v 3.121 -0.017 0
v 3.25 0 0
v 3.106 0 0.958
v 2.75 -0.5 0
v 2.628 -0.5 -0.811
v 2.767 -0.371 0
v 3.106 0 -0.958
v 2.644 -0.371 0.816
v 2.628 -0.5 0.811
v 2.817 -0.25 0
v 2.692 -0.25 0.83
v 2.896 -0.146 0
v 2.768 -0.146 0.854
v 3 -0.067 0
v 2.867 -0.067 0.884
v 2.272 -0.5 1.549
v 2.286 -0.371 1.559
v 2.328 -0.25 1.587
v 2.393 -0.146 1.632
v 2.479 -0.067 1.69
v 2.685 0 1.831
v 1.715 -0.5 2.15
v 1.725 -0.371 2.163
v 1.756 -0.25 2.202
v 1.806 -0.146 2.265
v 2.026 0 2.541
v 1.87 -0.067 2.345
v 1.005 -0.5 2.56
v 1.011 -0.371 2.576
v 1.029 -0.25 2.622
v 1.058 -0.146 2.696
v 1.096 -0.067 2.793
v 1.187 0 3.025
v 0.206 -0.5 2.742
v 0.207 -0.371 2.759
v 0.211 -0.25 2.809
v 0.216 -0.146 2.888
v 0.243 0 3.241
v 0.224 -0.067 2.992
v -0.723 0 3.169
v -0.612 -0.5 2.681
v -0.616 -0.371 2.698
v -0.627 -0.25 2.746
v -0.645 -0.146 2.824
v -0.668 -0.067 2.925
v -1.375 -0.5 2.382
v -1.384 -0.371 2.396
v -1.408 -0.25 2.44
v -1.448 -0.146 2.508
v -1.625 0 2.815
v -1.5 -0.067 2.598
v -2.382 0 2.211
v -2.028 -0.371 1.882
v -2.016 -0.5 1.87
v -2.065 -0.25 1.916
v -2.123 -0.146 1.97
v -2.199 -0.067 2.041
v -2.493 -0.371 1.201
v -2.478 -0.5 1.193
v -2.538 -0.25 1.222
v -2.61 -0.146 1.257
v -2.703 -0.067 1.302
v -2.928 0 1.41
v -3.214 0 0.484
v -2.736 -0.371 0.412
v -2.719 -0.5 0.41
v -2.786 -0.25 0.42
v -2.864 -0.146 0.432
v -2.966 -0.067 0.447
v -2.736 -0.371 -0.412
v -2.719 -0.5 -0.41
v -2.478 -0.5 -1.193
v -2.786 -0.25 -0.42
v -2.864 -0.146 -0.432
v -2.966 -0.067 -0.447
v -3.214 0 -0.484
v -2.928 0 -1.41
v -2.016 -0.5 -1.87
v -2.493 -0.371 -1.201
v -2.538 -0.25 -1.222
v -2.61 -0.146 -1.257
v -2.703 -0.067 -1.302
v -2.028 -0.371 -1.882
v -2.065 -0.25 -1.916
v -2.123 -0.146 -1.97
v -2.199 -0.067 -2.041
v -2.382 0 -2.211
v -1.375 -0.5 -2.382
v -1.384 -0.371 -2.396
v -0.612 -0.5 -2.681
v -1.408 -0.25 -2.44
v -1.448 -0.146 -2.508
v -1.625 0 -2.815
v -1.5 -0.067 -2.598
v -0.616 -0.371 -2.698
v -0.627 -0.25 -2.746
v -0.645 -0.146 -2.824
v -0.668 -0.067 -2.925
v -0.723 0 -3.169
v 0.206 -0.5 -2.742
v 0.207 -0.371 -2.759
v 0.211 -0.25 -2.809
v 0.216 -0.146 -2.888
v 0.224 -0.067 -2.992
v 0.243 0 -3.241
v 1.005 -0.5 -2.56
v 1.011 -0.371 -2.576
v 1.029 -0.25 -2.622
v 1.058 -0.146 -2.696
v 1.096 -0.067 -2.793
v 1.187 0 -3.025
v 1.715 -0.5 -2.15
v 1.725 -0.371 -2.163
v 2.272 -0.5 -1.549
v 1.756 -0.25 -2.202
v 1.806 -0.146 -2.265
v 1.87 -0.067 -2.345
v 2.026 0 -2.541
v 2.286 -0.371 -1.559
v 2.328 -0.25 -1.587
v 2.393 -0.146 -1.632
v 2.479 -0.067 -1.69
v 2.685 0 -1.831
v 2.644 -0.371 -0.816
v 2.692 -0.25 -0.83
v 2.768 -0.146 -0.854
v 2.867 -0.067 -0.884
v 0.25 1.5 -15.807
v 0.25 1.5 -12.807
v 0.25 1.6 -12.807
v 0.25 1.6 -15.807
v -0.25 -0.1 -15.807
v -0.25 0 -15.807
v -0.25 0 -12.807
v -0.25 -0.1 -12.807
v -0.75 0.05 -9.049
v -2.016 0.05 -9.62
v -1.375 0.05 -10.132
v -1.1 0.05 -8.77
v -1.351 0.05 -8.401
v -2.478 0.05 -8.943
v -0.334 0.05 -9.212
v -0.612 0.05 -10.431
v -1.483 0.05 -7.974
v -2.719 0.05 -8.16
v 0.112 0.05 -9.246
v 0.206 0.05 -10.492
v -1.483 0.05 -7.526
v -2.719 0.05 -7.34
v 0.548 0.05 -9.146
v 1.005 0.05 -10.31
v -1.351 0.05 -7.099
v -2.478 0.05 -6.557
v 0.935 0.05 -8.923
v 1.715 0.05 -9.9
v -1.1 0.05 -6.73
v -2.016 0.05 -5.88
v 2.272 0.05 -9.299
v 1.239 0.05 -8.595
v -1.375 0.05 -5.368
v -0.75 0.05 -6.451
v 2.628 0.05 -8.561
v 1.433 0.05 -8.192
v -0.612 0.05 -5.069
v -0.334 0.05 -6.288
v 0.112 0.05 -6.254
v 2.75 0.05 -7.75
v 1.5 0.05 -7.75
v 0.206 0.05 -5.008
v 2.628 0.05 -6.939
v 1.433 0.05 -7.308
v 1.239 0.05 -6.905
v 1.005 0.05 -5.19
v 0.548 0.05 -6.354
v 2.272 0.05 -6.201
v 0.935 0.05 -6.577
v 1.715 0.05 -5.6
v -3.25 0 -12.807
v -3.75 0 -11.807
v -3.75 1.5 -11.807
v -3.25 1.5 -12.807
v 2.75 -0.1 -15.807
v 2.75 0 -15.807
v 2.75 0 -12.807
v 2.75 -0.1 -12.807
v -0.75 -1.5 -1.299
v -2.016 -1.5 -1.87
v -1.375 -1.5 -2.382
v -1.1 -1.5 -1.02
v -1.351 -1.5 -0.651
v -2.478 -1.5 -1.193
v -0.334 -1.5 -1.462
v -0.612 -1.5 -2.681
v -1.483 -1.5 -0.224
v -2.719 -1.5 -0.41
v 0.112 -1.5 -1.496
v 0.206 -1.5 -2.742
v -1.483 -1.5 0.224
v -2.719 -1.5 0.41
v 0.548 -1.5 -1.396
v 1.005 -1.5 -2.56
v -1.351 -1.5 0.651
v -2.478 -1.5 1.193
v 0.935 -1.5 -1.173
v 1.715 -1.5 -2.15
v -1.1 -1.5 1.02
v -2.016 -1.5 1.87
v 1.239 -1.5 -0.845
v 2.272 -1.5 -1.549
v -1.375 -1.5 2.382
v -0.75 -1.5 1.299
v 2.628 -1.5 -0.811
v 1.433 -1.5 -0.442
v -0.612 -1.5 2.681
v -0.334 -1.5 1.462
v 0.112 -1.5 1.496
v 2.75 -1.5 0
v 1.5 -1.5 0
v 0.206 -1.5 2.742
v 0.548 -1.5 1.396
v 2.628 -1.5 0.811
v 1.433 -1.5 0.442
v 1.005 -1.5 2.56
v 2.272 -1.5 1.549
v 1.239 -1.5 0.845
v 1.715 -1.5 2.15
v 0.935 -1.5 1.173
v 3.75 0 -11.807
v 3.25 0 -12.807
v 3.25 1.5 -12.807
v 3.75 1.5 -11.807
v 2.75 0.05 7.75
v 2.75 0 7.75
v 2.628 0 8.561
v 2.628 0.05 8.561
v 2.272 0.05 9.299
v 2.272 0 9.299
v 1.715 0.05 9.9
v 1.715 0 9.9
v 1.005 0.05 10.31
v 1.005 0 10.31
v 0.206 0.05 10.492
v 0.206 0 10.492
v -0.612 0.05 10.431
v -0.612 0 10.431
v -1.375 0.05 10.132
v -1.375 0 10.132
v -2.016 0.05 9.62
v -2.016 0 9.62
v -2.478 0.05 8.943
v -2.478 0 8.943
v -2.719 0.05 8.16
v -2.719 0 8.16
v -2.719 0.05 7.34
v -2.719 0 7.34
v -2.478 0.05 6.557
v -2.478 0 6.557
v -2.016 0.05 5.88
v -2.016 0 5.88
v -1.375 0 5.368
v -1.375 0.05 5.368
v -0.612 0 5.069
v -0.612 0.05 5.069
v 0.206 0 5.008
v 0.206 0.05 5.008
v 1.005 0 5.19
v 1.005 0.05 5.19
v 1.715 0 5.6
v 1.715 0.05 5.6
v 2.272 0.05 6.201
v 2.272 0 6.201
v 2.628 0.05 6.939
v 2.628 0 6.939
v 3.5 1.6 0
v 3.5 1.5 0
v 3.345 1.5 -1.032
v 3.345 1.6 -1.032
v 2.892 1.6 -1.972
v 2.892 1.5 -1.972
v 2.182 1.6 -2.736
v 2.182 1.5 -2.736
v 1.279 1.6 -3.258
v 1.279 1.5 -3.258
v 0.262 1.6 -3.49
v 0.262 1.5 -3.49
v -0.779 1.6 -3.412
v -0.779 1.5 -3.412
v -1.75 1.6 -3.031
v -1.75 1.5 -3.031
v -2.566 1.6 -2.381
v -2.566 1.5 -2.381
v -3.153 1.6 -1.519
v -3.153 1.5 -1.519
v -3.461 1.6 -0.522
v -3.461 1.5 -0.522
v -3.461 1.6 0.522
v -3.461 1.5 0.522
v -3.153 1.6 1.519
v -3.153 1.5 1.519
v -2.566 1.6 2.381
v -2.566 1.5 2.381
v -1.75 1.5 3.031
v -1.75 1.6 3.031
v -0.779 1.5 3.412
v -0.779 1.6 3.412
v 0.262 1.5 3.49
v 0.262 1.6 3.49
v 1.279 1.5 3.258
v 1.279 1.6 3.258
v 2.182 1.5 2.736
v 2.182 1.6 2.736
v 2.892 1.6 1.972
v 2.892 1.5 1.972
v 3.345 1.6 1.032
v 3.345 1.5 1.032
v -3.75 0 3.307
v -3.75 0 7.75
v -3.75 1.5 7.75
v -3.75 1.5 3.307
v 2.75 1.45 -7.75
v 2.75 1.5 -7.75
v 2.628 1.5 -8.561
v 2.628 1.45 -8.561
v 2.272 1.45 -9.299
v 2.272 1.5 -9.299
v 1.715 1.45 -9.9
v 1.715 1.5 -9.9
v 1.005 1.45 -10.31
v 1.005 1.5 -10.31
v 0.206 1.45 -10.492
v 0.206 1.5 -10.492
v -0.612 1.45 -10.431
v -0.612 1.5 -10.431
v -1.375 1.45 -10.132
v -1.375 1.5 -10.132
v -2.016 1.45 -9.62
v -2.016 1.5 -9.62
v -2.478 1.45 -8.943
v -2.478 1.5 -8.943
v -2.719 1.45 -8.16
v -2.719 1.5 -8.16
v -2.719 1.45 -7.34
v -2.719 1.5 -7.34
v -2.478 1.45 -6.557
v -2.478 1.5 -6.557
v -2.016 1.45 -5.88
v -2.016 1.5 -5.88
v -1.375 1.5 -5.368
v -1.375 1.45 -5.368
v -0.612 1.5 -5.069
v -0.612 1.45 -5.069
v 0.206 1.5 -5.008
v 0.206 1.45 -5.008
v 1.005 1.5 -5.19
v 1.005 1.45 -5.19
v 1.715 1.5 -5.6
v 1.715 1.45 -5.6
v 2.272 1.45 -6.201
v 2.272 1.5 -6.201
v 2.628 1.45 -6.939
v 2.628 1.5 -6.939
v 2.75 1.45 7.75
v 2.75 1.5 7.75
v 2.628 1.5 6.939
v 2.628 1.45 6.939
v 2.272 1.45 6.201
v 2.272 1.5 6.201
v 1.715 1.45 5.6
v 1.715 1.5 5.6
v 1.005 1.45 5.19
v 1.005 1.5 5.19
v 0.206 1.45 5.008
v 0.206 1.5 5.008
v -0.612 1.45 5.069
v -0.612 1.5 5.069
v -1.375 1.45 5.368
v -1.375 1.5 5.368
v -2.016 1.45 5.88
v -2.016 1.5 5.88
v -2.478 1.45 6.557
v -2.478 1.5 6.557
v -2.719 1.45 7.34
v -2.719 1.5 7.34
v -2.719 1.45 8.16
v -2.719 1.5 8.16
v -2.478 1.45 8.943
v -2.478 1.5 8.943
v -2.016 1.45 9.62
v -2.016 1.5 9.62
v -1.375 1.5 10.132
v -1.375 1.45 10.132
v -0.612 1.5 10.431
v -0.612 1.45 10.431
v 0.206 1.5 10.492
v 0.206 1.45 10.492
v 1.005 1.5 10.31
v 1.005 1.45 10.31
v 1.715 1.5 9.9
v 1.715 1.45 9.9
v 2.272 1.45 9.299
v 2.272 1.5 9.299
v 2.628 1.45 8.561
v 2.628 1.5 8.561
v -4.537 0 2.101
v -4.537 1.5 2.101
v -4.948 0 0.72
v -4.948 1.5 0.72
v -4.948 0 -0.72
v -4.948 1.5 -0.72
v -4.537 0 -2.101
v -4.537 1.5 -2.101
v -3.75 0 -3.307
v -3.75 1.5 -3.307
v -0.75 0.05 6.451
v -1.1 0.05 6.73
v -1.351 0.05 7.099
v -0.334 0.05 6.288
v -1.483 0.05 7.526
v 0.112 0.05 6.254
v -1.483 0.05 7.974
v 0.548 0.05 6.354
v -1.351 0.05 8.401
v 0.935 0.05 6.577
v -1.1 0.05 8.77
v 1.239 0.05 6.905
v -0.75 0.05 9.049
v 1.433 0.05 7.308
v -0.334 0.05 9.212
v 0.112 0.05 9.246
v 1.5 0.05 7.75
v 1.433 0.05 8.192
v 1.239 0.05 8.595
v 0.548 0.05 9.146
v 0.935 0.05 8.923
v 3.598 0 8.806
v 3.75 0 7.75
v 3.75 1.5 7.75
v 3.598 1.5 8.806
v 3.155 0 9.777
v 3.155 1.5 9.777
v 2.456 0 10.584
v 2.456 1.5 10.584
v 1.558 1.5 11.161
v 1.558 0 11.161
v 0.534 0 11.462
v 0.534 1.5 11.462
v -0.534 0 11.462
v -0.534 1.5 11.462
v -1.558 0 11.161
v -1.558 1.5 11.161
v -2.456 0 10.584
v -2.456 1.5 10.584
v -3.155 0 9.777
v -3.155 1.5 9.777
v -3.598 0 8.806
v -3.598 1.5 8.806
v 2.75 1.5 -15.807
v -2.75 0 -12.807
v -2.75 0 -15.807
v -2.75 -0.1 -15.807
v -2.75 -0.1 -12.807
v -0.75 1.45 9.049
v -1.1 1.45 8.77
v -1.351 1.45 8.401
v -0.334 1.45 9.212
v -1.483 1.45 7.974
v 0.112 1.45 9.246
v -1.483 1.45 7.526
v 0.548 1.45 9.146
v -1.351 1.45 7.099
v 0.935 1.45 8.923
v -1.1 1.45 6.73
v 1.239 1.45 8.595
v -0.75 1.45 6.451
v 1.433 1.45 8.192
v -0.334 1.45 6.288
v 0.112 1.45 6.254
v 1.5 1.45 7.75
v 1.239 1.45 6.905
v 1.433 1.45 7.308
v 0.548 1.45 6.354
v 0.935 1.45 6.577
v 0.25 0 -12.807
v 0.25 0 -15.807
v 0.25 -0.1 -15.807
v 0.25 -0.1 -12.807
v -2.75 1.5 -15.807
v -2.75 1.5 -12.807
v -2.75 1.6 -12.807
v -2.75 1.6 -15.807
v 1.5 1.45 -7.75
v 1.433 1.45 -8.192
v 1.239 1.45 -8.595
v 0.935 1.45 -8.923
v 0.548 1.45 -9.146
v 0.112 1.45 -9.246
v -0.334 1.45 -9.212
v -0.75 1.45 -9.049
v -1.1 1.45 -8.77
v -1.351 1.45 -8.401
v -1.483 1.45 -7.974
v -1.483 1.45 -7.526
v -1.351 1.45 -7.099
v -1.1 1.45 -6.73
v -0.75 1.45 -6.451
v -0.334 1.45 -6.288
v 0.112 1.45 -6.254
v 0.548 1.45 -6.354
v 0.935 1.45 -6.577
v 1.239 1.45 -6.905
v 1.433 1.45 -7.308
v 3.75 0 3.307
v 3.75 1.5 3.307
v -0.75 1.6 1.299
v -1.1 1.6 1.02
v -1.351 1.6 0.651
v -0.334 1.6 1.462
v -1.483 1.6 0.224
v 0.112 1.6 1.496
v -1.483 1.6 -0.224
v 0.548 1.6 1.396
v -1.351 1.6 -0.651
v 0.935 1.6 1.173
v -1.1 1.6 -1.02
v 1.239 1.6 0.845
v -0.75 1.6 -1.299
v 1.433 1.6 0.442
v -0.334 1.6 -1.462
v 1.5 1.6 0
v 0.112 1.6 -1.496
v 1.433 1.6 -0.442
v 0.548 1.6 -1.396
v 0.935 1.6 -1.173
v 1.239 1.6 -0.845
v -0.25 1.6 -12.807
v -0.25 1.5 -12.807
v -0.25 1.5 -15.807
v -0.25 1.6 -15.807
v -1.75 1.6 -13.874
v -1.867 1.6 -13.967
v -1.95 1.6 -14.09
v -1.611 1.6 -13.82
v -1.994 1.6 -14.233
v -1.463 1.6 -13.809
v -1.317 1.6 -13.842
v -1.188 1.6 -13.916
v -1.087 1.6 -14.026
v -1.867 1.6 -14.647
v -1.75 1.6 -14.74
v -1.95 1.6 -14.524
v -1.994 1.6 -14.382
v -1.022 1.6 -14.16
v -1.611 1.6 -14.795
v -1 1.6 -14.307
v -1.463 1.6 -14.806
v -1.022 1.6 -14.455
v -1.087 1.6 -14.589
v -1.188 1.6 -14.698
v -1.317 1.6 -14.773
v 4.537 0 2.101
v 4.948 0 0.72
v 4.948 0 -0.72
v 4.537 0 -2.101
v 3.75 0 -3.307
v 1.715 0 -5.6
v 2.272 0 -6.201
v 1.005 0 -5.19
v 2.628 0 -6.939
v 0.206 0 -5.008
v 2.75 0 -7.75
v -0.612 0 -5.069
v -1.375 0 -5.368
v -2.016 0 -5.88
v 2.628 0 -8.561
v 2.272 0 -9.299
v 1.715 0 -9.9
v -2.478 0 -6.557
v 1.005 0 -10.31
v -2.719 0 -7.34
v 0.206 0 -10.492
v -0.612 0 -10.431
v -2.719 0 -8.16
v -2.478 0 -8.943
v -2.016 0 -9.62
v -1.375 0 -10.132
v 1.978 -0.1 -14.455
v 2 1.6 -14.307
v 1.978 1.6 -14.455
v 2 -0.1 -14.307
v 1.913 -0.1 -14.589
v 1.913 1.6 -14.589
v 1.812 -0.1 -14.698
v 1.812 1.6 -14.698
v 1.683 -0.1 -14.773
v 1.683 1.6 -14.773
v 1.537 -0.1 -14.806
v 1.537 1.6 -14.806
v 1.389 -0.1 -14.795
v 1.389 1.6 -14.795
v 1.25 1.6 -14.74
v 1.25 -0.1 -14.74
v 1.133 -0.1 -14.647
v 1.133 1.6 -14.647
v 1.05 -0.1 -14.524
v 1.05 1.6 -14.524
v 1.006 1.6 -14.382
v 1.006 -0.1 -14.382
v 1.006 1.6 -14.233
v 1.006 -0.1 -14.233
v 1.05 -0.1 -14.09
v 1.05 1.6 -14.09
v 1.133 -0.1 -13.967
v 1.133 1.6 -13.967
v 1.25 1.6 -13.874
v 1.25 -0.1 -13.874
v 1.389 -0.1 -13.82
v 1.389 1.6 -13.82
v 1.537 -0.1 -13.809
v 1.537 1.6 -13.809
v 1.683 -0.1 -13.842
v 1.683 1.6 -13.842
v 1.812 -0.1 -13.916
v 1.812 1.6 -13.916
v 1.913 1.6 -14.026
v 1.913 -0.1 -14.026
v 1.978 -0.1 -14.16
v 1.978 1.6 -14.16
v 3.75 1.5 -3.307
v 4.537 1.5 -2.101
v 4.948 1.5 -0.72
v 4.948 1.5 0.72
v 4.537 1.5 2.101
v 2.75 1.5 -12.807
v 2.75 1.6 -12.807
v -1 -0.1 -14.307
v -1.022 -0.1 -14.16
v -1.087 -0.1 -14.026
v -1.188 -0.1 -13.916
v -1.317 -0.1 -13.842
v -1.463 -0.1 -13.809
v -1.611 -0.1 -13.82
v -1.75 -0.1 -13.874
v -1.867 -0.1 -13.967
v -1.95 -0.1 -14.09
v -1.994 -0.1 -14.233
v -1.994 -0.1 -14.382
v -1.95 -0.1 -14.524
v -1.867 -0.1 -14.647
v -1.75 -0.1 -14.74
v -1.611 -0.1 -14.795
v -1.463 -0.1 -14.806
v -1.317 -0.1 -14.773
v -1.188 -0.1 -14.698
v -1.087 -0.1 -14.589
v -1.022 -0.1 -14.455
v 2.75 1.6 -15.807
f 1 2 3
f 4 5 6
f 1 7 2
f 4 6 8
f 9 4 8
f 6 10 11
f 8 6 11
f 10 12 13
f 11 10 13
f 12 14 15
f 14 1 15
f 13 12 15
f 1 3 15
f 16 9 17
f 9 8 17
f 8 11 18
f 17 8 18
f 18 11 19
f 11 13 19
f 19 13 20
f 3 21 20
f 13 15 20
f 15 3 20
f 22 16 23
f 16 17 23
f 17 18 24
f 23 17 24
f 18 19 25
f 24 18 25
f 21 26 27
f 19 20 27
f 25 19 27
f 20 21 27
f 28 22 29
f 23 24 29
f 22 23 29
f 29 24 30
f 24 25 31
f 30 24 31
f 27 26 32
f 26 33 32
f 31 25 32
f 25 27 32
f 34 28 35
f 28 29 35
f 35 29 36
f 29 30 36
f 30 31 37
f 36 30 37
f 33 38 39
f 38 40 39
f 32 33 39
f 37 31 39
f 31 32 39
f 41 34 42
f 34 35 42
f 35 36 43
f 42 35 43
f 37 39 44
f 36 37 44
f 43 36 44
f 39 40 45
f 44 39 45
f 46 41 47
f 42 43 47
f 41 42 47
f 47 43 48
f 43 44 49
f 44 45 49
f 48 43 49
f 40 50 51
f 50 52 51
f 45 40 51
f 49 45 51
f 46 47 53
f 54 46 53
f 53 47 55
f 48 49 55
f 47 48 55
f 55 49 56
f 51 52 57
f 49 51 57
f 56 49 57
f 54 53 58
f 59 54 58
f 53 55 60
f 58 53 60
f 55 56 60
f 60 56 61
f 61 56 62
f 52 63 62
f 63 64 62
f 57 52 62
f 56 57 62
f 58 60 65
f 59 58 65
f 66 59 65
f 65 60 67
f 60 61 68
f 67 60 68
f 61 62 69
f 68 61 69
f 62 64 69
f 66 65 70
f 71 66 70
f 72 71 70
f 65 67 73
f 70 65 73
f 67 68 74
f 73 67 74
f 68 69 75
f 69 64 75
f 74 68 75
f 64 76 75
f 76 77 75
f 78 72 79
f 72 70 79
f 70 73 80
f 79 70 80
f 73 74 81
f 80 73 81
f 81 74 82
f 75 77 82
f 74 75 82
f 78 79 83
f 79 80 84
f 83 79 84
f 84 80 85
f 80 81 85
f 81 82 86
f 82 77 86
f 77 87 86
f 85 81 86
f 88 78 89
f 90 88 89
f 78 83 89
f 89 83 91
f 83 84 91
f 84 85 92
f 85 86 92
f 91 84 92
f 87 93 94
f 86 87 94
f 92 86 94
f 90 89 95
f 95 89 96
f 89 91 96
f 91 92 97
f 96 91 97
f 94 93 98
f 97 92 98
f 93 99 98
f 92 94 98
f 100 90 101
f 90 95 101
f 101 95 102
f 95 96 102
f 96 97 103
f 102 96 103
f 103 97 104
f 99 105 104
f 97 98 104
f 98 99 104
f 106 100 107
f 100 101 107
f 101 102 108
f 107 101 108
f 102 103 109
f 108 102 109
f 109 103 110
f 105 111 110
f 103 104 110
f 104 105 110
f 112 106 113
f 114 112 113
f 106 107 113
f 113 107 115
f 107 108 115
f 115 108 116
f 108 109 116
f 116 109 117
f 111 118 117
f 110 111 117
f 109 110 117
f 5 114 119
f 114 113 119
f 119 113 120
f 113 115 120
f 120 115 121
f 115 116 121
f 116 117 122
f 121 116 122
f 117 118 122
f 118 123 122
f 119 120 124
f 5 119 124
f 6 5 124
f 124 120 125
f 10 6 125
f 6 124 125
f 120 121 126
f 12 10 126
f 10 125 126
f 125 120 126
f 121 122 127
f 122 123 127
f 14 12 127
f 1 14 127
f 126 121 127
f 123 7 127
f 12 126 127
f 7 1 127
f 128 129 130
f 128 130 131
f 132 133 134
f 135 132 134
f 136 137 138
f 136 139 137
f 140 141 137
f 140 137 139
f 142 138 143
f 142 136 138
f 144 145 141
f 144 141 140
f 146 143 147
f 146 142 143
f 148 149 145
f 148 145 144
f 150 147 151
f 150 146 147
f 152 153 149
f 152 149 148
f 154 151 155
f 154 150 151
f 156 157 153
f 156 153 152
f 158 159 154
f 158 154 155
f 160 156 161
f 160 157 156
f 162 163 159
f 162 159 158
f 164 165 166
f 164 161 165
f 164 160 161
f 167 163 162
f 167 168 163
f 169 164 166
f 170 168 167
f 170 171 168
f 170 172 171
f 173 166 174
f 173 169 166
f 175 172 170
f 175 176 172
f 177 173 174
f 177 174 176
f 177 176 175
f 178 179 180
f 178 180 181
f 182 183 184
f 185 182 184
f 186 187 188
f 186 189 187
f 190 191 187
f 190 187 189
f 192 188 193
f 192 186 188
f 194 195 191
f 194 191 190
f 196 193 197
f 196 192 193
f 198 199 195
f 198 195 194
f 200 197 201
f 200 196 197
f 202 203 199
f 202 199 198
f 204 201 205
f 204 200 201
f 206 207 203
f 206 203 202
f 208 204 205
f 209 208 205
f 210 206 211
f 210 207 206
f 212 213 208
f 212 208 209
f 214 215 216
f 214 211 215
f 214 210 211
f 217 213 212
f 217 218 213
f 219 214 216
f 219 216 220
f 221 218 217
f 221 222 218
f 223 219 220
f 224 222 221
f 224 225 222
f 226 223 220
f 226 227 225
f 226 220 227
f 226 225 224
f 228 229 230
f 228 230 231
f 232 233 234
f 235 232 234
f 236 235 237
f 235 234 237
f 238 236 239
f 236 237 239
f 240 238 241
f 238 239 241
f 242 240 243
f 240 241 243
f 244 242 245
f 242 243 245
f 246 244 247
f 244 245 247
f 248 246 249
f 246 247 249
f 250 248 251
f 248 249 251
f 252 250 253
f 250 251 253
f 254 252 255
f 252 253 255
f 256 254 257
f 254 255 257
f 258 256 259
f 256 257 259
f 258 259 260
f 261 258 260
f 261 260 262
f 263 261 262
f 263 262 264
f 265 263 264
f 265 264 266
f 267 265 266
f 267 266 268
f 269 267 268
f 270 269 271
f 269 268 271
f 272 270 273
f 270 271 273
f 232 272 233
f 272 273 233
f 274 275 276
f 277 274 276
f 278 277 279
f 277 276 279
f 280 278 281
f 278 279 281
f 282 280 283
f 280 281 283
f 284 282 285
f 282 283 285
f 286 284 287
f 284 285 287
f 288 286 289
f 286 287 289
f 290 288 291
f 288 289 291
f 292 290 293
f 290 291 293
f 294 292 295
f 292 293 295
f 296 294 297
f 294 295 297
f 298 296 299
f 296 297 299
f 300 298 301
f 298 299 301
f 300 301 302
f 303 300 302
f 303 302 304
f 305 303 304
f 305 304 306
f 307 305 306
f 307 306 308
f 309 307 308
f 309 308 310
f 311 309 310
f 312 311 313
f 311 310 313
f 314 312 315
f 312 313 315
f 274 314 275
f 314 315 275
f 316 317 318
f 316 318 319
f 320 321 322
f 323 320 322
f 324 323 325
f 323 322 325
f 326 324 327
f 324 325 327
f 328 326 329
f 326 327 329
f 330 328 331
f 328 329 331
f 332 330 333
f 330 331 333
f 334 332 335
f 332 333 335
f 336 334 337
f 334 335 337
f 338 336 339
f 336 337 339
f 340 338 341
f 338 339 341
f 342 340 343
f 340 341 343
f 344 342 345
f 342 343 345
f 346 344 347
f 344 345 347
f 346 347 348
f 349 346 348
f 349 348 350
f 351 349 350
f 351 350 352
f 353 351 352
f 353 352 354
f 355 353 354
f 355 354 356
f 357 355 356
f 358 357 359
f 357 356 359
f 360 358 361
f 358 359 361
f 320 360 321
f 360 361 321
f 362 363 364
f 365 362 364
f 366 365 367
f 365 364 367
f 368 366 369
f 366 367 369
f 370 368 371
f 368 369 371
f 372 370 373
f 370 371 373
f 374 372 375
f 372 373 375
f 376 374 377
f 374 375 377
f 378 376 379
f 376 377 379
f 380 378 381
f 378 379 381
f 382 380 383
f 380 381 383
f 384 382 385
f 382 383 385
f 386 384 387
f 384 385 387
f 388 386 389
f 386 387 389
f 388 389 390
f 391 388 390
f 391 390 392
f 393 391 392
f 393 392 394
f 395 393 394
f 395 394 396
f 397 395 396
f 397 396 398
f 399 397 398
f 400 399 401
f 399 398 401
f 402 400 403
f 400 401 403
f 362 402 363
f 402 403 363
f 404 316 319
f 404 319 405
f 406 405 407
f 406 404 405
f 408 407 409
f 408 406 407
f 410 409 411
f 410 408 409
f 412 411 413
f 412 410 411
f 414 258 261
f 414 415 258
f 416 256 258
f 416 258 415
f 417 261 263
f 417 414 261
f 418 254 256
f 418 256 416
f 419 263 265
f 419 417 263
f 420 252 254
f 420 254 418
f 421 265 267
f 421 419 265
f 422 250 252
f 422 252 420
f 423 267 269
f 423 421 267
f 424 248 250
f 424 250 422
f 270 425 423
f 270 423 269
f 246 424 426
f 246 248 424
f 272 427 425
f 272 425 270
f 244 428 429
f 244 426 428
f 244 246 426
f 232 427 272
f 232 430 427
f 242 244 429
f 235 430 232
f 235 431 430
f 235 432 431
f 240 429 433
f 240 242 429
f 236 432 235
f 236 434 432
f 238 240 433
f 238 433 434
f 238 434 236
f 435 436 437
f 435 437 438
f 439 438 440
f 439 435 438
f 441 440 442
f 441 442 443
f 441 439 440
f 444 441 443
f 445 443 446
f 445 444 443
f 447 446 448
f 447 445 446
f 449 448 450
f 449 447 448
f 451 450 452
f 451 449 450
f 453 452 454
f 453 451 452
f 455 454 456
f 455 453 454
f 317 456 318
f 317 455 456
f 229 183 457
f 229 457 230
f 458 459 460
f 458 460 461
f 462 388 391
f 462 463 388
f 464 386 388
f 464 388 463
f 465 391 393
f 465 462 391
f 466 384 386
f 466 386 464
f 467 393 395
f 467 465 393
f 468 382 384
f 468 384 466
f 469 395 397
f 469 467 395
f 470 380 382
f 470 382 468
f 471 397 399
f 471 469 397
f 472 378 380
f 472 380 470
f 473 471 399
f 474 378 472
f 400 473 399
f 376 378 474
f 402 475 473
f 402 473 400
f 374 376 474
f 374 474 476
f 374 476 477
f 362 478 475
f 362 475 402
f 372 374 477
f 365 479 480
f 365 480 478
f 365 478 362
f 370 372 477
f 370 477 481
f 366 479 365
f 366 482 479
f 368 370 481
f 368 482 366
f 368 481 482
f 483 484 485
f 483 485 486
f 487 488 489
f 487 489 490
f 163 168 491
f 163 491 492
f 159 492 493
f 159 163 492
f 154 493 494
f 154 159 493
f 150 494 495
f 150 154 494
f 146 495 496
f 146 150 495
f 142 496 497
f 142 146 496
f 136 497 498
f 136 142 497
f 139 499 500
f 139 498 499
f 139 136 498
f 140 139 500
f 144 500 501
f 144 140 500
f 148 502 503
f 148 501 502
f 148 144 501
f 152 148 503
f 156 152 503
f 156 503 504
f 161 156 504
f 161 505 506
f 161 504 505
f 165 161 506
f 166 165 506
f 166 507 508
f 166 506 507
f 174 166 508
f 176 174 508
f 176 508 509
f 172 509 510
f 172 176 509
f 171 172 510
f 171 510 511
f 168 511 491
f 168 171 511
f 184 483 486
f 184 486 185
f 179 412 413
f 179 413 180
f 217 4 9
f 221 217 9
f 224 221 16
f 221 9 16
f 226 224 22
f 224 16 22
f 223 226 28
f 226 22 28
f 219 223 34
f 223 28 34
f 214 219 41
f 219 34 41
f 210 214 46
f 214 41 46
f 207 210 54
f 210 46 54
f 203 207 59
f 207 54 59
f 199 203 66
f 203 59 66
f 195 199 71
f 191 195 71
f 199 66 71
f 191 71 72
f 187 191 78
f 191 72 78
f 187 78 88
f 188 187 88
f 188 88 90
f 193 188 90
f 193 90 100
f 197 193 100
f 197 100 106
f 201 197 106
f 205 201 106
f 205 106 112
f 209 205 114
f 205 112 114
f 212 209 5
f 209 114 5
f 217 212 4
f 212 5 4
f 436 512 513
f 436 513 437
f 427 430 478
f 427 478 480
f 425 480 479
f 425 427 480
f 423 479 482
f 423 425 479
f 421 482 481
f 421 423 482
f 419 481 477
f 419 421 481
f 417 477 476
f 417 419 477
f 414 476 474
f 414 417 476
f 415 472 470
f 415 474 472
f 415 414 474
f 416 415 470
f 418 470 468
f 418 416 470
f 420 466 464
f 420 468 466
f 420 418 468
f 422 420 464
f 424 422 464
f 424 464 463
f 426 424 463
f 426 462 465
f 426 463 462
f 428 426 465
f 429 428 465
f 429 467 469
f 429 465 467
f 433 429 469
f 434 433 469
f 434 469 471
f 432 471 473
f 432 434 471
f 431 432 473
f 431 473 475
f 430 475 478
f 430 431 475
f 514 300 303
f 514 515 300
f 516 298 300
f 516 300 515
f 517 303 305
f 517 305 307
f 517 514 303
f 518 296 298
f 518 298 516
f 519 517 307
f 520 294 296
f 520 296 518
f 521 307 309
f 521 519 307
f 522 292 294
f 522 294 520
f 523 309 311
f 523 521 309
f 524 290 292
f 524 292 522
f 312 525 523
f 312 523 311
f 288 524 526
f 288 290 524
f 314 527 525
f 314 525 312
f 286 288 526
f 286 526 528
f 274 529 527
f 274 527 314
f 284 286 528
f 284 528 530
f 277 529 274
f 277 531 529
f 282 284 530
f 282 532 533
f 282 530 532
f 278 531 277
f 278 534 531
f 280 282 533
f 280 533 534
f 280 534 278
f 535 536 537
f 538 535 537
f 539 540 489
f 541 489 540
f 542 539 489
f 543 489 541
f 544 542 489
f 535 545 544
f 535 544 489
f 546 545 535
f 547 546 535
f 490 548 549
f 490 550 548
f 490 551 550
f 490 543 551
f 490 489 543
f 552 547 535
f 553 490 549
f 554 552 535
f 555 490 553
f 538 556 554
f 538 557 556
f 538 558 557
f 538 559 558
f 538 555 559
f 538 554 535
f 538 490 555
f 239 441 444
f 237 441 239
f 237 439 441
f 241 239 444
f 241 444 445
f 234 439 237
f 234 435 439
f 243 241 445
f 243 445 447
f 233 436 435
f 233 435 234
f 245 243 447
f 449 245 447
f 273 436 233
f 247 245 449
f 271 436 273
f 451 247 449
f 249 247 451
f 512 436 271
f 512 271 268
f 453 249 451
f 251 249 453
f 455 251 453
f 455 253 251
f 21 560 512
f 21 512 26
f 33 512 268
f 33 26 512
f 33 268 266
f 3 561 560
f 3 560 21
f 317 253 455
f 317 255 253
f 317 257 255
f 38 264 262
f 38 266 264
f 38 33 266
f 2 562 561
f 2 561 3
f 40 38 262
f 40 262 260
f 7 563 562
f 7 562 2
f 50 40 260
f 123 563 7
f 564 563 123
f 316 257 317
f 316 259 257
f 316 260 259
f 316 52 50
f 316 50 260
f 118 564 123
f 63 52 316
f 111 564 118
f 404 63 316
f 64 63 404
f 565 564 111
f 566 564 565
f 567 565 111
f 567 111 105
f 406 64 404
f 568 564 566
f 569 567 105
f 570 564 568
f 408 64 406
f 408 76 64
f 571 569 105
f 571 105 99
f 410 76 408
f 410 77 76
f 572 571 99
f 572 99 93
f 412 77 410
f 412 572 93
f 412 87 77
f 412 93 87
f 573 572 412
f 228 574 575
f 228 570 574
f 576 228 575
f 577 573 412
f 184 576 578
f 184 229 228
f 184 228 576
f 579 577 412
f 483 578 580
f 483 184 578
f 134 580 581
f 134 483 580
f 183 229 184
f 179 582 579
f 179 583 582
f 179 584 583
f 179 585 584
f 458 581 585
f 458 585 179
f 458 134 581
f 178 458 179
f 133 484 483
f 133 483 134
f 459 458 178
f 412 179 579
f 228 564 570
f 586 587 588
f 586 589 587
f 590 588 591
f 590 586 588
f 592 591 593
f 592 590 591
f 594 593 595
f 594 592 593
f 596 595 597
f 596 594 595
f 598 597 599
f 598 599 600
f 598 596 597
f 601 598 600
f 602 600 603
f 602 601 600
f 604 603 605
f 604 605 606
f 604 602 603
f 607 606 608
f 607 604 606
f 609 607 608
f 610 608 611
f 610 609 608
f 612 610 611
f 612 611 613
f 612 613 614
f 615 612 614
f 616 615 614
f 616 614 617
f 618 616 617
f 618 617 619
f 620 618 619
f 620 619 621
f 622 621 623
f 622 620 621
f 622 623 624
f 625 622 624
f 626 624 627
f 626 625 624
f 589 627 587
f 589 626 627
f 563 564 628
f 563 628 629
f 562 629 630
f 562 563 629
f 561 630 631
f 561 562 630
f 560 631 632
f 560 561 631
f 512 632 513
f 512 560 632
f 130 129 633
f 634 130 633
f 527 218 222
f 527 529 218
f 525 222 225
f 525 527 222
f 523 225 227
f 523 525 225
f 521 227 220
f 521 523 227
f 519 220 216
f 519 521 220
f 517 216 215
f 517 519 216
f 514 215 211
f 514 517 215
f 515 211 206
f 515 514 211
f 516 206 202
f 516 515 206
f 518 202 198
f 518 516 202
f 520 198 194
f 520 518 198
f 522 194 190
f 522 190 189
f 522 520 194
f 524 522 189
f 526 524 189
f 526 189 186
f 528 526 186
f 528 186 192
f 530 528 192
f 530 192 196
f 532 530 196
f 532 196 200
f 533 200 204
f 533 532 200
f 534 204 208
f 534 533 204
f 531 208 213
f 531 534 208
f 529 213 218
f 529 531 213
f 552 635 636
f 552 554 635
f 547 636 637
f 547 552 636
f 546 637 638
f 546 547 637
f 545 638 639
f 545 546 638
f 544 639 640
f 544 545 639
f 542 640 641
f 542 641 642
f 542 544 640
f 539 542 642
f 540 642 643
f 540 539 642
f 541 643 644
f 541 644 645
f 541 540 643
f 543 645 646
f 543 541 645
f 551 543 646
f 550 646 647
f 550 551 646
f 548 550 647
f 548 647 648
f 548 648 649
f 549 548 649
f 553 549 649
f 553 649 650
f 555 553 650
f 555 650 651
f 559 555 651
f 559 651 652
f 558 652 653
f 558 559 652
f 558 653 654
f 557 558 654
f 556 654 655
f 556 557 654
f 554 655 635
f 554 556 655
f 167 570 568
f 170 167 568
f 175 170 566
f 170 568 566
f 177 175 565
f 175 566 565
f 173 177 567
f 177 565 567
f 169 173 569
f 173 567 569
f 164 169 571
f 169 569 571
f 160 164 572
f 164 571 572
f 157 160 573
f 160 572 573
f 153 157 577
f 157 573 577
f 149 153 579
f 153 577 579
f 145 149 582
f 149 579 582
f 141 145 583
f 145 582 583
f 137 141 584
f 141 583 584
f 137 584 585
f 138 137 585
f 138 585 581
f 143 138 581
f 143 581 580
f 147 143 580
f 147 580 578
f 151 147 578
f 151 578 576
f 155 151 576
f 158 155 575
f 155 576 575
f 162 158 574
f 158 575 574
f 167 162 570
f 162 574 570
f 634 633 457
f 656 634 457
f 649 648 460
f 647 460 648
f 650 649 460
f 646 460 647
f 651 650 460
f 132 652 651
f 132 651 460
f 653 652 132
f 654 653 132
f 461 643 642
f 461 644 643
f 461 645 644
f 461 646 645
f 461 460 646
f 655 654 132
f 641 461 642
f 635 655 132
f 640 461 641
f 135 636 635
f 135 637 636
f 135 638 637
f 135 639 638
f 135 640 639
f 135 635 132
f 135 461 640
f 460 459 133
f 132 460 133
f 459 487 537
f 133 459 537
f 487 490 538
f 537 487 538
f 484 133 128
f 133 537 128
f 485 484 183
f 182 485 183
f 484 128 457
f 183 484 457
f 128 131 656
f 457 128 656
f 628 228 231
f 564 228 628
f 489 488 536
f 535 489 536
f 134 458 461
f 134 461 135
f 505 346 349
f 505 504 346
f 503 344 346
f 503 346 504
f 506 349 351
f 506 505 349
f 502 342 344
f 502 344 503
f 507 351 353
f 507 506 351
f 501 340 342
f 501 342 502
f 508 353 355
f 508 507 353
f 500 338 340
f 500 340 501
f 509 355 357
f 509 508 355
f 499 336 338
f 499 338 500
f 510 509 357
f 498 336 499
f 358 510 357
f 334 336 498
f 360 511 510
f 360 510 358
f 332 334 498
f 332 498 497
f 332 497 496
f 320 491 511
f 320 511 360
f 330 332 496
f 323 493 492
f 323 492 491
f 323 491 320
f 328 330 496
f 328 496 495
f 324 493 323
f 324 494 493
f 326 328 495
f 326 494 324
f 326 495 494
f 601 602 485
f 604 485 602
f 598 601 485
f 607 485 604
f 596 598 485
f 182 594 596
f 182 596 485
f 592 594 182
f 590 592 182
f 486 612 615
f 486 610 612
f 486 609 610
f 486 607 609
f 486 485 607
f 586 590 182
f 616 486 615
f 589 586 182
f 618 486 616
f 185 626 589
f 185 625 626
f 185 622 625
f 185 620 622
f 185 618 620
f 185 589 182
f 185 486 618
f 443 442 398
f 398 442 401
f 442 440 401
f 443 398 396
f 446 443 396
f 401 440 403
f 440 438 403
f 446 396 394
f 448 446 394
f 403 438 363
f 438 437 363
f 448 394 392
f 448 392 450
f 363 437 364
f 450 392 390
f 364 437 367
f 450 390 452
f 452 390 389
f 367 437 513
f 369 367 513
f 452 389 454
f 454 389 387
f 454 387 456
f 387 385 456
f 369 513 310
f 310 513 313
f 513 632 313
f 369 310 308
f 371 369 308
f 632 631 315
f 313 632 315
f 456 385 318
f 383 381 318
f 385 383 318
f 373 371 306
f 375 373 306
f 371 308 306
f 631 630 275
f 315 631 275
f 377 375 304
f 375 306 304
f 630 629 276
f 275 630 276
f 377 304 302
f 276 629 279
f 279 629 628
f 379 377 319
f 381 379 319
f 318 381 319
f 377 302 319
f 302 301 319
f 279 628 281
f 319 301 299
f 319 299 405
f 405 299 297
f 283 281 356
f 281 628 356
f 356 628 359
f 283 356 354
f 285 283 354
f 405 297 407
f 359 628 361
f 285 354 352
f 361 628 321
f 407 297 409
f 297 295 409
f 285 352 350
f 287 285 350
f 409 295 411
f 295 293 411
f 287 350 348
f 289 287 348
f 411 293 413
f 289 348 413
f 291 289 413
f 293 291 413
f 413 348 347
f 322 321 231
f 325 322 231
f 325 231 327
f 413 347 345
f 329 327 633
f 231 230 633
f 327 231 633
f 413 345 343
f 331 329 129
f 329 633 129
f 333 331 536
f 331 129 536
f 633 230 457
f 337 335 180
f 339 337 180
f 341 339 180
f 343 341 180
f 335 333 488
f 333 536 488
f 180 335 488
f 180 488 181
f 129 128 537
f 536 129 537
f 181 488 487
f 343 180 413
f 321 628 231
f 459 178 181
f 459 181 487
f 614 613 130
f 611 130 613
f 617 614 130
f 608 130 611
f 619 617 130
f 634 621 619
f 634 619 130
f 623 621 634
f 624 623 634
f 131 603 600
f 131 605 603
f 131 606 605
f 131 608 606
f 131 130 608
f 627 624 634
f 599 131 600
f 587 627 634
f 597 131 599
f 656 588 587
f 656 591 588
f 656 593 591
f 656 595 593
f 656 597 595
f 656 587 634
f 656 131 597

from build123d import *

# Parameters (mm, degrees)
SKETCH1_R           = 1.5
SKETCH1_R_2         = 0.5
BOSS_EXTRUDE1_DEPTH = 1.5
SKETCH2_R           = 3.5
SKETCH2_R_2         = 1.5
BOSS_EXTRUDE2_DEPTH = 0.1
SKETCH3_R           = 2.75
CUT_EXTRUDE1_DEPTH  = 0.05
SKETCH4_R           = 2.75
CUT_EXTRUDE2_DEPTH  = 0.05
SKETCH5_R           = 2.75
SKETCH5_R_2         = 1.5
BOSS_EXTRUDE3_DEPTH = 1.5
FILLET1_R           = 0.5
SKETCH6_W           = 2.5
SKETCH6_H           = 3
SKETCH6_R           = 0.5
BOSS_EXTRUDE4_DEPTH = 0.1
SKETCH7_W           = 2.5
SKETCH7_H           = 3
SKETCH7_R           = 0.5
BOSS_EXTRUDE5_DEPTH = 0.1


with BuildPart() as part:
    # Sketch1 → Boss-Extrude1 (new body)
    with BuildSketch(Plane(origin=(0, 0, 0), x_dir=(1, 0, 0), z_dir=(0, 1, 0))):
        with BuildLine():
            Line((-3.75, -7.75), (-3.75, -3.307189139))
            ThreePointArc((-3.75, -3.307189139), (-5, 0), (-3.75, 3.307189139))
            Line((-3.75, 3.307189139), (-3.75, 11.807189139))
            Line((-3.75, 11.807189139), (-3.25, 12.807189139))
            Line((-3.25, 12.807189139), (-2.75, 15.807189139))
            Line((-2.75, 15.807189139), (2.75, 15.807189139))
            Line((2.75, 15.807189139), (3.25, 12.807189139))
            Line((3.25, 12.807189139), (3.75, 11.807189139))
            Line((3.75, 11.807189139), (3.75, 3.307189139))
            ThreePointArc((3.75, 3.307189139), (5, 0), (3.75, -3.307189139))
            Line((3.75, -3.307189139), (3.75, -7.75))
            ThreePointArc((3.75, -7.75), (0, -11.5), (-3.75, -7.75))
        make_face()
        with Locations((0, -7.75)):
            Circle(SKETCH1_R, mode=Mode.SUBTRACT)
        with Locations((0, 7.75)):
            Circle(SKETCH1_R, mode=Mode.SUBTRACT)
        with Locations((-1.5, 14.307189139)):
            Circle(SKETCH1_R_2, mode=Mode.SUBTRACT)
        with Locations((1.5, 14.307189139)):
            Circle(SKETCH1_R_2, mode=Mode.SUBTRACT)
        Circle(SKETCH1_R, mode=Mode.SUBTRACT)
    extrude(amount=BOSS_EXTRUDE1_DEPTH)

    # Sketch2 → Boss-Extrude2 (add)
    with BuildSketch(Plane(origin=(0, 1.5, 0), x_dir=(1, 0, 0), z_dir=(0, 1, 0))):
        Circle(SKETCH2_R)
        Circle(SKETCH2_R_2, mode=Mode.SUBTRACT)
    extrude(amount=BOSS_EXTRUDE2_DEPTH)

    # Sketch3 → Cut-Extrude1 (cut)
    with BuildSketch(Plane(origin=(0, 1.5, 0), x_dir=(1, 0, 0), z_dir=(0, 1, 0))):
        with Locations((0, -7.75)):
            Circle(SKETCH3_R)
        with Locations((0, 7.75)):
            Circle(SKETCH3_R)
    extrude(amount=-CUT_EXTRUDE1_DEPTH, mode=Mode.SUBTRACT)

    # Sketch4 → Cut-Extrude2 (cut)
    with BuildSketch(Plane.XZ):
        with Locations((0, -7.75)):
            Circle(SKETCH4_R)
        with Locations((0, 7.75)):
            Circle(SKETCH4_R)
    extrude(amount=-CUT_EXTRUDE2_DEPTH, mode=Mode.SUBTRACT)

    # Sketch5 → Boss-Extrude3 (add)
    with BuildSketch(Plane.XZ):
        Circle(SKETCH5_R)
        Circle(SKETCH5_R_2, mode=Mode.SUBTRACT)
    extrude(amount=BOSS_EXTRUDE3_DEPTH)

    # Fillet1
    fillet1_edges = [part.edges().sort_by_distance(p)[0] for p in [
        (-2.75, 0, 0),
    ]]
    fillet(fillet1_edges, radius=FILLET1_R)

    # Sketch6 → Boss-Extrude4 (add)
    with BuildSketch(Plane(origin=(0, 1.5, 0), x_dir=(1, 0, 0), z_dir=(0, 1, 0))):
        with Locations((-1.5, 14.307189139)):
            Rectangle(SKETCH6_W, SKETCH6_H)
        with Locations((-1.5, 14.307189139)):
            Circle(SKETCH6_R, mode=Mode.SUBTRACT)
        with Locations((1.5, 14.307189139)):
            Rectangle(SKETCH6_W, SKETCH6_H)
        with Locations((1.5, 14.307189139)):
            Circle(SKETCH6_R, mode=Mode.SUBTRACT)
    extrude(amount=BOSS_EXTRUDE4_DEPTH)

    # Sketch7 → Boss-Extrude5 (add)
    with BuildSketch(Plane.XZ):
        with Locations((-1.5, -14.307189139)):
            Rectangle(SKETCH7_W, SKETCH7_H)
        with Locations((-1.5, -14.307189139)):
            Circle(SKETCH7_R, mode=Mode.SUBTRACT)
        with Locations((1.5, -14.307189139)):
            Rectangle(SKETCH7_W, SKETCH7_H)
        with Locations((1.5, -14.307189139)):
            Circle(SKETCH7_R, mode=Mode.SUBTRACT)
    extrude(amount=BOSS_EXTRUDE5_DEPTH)


solid = part.part
